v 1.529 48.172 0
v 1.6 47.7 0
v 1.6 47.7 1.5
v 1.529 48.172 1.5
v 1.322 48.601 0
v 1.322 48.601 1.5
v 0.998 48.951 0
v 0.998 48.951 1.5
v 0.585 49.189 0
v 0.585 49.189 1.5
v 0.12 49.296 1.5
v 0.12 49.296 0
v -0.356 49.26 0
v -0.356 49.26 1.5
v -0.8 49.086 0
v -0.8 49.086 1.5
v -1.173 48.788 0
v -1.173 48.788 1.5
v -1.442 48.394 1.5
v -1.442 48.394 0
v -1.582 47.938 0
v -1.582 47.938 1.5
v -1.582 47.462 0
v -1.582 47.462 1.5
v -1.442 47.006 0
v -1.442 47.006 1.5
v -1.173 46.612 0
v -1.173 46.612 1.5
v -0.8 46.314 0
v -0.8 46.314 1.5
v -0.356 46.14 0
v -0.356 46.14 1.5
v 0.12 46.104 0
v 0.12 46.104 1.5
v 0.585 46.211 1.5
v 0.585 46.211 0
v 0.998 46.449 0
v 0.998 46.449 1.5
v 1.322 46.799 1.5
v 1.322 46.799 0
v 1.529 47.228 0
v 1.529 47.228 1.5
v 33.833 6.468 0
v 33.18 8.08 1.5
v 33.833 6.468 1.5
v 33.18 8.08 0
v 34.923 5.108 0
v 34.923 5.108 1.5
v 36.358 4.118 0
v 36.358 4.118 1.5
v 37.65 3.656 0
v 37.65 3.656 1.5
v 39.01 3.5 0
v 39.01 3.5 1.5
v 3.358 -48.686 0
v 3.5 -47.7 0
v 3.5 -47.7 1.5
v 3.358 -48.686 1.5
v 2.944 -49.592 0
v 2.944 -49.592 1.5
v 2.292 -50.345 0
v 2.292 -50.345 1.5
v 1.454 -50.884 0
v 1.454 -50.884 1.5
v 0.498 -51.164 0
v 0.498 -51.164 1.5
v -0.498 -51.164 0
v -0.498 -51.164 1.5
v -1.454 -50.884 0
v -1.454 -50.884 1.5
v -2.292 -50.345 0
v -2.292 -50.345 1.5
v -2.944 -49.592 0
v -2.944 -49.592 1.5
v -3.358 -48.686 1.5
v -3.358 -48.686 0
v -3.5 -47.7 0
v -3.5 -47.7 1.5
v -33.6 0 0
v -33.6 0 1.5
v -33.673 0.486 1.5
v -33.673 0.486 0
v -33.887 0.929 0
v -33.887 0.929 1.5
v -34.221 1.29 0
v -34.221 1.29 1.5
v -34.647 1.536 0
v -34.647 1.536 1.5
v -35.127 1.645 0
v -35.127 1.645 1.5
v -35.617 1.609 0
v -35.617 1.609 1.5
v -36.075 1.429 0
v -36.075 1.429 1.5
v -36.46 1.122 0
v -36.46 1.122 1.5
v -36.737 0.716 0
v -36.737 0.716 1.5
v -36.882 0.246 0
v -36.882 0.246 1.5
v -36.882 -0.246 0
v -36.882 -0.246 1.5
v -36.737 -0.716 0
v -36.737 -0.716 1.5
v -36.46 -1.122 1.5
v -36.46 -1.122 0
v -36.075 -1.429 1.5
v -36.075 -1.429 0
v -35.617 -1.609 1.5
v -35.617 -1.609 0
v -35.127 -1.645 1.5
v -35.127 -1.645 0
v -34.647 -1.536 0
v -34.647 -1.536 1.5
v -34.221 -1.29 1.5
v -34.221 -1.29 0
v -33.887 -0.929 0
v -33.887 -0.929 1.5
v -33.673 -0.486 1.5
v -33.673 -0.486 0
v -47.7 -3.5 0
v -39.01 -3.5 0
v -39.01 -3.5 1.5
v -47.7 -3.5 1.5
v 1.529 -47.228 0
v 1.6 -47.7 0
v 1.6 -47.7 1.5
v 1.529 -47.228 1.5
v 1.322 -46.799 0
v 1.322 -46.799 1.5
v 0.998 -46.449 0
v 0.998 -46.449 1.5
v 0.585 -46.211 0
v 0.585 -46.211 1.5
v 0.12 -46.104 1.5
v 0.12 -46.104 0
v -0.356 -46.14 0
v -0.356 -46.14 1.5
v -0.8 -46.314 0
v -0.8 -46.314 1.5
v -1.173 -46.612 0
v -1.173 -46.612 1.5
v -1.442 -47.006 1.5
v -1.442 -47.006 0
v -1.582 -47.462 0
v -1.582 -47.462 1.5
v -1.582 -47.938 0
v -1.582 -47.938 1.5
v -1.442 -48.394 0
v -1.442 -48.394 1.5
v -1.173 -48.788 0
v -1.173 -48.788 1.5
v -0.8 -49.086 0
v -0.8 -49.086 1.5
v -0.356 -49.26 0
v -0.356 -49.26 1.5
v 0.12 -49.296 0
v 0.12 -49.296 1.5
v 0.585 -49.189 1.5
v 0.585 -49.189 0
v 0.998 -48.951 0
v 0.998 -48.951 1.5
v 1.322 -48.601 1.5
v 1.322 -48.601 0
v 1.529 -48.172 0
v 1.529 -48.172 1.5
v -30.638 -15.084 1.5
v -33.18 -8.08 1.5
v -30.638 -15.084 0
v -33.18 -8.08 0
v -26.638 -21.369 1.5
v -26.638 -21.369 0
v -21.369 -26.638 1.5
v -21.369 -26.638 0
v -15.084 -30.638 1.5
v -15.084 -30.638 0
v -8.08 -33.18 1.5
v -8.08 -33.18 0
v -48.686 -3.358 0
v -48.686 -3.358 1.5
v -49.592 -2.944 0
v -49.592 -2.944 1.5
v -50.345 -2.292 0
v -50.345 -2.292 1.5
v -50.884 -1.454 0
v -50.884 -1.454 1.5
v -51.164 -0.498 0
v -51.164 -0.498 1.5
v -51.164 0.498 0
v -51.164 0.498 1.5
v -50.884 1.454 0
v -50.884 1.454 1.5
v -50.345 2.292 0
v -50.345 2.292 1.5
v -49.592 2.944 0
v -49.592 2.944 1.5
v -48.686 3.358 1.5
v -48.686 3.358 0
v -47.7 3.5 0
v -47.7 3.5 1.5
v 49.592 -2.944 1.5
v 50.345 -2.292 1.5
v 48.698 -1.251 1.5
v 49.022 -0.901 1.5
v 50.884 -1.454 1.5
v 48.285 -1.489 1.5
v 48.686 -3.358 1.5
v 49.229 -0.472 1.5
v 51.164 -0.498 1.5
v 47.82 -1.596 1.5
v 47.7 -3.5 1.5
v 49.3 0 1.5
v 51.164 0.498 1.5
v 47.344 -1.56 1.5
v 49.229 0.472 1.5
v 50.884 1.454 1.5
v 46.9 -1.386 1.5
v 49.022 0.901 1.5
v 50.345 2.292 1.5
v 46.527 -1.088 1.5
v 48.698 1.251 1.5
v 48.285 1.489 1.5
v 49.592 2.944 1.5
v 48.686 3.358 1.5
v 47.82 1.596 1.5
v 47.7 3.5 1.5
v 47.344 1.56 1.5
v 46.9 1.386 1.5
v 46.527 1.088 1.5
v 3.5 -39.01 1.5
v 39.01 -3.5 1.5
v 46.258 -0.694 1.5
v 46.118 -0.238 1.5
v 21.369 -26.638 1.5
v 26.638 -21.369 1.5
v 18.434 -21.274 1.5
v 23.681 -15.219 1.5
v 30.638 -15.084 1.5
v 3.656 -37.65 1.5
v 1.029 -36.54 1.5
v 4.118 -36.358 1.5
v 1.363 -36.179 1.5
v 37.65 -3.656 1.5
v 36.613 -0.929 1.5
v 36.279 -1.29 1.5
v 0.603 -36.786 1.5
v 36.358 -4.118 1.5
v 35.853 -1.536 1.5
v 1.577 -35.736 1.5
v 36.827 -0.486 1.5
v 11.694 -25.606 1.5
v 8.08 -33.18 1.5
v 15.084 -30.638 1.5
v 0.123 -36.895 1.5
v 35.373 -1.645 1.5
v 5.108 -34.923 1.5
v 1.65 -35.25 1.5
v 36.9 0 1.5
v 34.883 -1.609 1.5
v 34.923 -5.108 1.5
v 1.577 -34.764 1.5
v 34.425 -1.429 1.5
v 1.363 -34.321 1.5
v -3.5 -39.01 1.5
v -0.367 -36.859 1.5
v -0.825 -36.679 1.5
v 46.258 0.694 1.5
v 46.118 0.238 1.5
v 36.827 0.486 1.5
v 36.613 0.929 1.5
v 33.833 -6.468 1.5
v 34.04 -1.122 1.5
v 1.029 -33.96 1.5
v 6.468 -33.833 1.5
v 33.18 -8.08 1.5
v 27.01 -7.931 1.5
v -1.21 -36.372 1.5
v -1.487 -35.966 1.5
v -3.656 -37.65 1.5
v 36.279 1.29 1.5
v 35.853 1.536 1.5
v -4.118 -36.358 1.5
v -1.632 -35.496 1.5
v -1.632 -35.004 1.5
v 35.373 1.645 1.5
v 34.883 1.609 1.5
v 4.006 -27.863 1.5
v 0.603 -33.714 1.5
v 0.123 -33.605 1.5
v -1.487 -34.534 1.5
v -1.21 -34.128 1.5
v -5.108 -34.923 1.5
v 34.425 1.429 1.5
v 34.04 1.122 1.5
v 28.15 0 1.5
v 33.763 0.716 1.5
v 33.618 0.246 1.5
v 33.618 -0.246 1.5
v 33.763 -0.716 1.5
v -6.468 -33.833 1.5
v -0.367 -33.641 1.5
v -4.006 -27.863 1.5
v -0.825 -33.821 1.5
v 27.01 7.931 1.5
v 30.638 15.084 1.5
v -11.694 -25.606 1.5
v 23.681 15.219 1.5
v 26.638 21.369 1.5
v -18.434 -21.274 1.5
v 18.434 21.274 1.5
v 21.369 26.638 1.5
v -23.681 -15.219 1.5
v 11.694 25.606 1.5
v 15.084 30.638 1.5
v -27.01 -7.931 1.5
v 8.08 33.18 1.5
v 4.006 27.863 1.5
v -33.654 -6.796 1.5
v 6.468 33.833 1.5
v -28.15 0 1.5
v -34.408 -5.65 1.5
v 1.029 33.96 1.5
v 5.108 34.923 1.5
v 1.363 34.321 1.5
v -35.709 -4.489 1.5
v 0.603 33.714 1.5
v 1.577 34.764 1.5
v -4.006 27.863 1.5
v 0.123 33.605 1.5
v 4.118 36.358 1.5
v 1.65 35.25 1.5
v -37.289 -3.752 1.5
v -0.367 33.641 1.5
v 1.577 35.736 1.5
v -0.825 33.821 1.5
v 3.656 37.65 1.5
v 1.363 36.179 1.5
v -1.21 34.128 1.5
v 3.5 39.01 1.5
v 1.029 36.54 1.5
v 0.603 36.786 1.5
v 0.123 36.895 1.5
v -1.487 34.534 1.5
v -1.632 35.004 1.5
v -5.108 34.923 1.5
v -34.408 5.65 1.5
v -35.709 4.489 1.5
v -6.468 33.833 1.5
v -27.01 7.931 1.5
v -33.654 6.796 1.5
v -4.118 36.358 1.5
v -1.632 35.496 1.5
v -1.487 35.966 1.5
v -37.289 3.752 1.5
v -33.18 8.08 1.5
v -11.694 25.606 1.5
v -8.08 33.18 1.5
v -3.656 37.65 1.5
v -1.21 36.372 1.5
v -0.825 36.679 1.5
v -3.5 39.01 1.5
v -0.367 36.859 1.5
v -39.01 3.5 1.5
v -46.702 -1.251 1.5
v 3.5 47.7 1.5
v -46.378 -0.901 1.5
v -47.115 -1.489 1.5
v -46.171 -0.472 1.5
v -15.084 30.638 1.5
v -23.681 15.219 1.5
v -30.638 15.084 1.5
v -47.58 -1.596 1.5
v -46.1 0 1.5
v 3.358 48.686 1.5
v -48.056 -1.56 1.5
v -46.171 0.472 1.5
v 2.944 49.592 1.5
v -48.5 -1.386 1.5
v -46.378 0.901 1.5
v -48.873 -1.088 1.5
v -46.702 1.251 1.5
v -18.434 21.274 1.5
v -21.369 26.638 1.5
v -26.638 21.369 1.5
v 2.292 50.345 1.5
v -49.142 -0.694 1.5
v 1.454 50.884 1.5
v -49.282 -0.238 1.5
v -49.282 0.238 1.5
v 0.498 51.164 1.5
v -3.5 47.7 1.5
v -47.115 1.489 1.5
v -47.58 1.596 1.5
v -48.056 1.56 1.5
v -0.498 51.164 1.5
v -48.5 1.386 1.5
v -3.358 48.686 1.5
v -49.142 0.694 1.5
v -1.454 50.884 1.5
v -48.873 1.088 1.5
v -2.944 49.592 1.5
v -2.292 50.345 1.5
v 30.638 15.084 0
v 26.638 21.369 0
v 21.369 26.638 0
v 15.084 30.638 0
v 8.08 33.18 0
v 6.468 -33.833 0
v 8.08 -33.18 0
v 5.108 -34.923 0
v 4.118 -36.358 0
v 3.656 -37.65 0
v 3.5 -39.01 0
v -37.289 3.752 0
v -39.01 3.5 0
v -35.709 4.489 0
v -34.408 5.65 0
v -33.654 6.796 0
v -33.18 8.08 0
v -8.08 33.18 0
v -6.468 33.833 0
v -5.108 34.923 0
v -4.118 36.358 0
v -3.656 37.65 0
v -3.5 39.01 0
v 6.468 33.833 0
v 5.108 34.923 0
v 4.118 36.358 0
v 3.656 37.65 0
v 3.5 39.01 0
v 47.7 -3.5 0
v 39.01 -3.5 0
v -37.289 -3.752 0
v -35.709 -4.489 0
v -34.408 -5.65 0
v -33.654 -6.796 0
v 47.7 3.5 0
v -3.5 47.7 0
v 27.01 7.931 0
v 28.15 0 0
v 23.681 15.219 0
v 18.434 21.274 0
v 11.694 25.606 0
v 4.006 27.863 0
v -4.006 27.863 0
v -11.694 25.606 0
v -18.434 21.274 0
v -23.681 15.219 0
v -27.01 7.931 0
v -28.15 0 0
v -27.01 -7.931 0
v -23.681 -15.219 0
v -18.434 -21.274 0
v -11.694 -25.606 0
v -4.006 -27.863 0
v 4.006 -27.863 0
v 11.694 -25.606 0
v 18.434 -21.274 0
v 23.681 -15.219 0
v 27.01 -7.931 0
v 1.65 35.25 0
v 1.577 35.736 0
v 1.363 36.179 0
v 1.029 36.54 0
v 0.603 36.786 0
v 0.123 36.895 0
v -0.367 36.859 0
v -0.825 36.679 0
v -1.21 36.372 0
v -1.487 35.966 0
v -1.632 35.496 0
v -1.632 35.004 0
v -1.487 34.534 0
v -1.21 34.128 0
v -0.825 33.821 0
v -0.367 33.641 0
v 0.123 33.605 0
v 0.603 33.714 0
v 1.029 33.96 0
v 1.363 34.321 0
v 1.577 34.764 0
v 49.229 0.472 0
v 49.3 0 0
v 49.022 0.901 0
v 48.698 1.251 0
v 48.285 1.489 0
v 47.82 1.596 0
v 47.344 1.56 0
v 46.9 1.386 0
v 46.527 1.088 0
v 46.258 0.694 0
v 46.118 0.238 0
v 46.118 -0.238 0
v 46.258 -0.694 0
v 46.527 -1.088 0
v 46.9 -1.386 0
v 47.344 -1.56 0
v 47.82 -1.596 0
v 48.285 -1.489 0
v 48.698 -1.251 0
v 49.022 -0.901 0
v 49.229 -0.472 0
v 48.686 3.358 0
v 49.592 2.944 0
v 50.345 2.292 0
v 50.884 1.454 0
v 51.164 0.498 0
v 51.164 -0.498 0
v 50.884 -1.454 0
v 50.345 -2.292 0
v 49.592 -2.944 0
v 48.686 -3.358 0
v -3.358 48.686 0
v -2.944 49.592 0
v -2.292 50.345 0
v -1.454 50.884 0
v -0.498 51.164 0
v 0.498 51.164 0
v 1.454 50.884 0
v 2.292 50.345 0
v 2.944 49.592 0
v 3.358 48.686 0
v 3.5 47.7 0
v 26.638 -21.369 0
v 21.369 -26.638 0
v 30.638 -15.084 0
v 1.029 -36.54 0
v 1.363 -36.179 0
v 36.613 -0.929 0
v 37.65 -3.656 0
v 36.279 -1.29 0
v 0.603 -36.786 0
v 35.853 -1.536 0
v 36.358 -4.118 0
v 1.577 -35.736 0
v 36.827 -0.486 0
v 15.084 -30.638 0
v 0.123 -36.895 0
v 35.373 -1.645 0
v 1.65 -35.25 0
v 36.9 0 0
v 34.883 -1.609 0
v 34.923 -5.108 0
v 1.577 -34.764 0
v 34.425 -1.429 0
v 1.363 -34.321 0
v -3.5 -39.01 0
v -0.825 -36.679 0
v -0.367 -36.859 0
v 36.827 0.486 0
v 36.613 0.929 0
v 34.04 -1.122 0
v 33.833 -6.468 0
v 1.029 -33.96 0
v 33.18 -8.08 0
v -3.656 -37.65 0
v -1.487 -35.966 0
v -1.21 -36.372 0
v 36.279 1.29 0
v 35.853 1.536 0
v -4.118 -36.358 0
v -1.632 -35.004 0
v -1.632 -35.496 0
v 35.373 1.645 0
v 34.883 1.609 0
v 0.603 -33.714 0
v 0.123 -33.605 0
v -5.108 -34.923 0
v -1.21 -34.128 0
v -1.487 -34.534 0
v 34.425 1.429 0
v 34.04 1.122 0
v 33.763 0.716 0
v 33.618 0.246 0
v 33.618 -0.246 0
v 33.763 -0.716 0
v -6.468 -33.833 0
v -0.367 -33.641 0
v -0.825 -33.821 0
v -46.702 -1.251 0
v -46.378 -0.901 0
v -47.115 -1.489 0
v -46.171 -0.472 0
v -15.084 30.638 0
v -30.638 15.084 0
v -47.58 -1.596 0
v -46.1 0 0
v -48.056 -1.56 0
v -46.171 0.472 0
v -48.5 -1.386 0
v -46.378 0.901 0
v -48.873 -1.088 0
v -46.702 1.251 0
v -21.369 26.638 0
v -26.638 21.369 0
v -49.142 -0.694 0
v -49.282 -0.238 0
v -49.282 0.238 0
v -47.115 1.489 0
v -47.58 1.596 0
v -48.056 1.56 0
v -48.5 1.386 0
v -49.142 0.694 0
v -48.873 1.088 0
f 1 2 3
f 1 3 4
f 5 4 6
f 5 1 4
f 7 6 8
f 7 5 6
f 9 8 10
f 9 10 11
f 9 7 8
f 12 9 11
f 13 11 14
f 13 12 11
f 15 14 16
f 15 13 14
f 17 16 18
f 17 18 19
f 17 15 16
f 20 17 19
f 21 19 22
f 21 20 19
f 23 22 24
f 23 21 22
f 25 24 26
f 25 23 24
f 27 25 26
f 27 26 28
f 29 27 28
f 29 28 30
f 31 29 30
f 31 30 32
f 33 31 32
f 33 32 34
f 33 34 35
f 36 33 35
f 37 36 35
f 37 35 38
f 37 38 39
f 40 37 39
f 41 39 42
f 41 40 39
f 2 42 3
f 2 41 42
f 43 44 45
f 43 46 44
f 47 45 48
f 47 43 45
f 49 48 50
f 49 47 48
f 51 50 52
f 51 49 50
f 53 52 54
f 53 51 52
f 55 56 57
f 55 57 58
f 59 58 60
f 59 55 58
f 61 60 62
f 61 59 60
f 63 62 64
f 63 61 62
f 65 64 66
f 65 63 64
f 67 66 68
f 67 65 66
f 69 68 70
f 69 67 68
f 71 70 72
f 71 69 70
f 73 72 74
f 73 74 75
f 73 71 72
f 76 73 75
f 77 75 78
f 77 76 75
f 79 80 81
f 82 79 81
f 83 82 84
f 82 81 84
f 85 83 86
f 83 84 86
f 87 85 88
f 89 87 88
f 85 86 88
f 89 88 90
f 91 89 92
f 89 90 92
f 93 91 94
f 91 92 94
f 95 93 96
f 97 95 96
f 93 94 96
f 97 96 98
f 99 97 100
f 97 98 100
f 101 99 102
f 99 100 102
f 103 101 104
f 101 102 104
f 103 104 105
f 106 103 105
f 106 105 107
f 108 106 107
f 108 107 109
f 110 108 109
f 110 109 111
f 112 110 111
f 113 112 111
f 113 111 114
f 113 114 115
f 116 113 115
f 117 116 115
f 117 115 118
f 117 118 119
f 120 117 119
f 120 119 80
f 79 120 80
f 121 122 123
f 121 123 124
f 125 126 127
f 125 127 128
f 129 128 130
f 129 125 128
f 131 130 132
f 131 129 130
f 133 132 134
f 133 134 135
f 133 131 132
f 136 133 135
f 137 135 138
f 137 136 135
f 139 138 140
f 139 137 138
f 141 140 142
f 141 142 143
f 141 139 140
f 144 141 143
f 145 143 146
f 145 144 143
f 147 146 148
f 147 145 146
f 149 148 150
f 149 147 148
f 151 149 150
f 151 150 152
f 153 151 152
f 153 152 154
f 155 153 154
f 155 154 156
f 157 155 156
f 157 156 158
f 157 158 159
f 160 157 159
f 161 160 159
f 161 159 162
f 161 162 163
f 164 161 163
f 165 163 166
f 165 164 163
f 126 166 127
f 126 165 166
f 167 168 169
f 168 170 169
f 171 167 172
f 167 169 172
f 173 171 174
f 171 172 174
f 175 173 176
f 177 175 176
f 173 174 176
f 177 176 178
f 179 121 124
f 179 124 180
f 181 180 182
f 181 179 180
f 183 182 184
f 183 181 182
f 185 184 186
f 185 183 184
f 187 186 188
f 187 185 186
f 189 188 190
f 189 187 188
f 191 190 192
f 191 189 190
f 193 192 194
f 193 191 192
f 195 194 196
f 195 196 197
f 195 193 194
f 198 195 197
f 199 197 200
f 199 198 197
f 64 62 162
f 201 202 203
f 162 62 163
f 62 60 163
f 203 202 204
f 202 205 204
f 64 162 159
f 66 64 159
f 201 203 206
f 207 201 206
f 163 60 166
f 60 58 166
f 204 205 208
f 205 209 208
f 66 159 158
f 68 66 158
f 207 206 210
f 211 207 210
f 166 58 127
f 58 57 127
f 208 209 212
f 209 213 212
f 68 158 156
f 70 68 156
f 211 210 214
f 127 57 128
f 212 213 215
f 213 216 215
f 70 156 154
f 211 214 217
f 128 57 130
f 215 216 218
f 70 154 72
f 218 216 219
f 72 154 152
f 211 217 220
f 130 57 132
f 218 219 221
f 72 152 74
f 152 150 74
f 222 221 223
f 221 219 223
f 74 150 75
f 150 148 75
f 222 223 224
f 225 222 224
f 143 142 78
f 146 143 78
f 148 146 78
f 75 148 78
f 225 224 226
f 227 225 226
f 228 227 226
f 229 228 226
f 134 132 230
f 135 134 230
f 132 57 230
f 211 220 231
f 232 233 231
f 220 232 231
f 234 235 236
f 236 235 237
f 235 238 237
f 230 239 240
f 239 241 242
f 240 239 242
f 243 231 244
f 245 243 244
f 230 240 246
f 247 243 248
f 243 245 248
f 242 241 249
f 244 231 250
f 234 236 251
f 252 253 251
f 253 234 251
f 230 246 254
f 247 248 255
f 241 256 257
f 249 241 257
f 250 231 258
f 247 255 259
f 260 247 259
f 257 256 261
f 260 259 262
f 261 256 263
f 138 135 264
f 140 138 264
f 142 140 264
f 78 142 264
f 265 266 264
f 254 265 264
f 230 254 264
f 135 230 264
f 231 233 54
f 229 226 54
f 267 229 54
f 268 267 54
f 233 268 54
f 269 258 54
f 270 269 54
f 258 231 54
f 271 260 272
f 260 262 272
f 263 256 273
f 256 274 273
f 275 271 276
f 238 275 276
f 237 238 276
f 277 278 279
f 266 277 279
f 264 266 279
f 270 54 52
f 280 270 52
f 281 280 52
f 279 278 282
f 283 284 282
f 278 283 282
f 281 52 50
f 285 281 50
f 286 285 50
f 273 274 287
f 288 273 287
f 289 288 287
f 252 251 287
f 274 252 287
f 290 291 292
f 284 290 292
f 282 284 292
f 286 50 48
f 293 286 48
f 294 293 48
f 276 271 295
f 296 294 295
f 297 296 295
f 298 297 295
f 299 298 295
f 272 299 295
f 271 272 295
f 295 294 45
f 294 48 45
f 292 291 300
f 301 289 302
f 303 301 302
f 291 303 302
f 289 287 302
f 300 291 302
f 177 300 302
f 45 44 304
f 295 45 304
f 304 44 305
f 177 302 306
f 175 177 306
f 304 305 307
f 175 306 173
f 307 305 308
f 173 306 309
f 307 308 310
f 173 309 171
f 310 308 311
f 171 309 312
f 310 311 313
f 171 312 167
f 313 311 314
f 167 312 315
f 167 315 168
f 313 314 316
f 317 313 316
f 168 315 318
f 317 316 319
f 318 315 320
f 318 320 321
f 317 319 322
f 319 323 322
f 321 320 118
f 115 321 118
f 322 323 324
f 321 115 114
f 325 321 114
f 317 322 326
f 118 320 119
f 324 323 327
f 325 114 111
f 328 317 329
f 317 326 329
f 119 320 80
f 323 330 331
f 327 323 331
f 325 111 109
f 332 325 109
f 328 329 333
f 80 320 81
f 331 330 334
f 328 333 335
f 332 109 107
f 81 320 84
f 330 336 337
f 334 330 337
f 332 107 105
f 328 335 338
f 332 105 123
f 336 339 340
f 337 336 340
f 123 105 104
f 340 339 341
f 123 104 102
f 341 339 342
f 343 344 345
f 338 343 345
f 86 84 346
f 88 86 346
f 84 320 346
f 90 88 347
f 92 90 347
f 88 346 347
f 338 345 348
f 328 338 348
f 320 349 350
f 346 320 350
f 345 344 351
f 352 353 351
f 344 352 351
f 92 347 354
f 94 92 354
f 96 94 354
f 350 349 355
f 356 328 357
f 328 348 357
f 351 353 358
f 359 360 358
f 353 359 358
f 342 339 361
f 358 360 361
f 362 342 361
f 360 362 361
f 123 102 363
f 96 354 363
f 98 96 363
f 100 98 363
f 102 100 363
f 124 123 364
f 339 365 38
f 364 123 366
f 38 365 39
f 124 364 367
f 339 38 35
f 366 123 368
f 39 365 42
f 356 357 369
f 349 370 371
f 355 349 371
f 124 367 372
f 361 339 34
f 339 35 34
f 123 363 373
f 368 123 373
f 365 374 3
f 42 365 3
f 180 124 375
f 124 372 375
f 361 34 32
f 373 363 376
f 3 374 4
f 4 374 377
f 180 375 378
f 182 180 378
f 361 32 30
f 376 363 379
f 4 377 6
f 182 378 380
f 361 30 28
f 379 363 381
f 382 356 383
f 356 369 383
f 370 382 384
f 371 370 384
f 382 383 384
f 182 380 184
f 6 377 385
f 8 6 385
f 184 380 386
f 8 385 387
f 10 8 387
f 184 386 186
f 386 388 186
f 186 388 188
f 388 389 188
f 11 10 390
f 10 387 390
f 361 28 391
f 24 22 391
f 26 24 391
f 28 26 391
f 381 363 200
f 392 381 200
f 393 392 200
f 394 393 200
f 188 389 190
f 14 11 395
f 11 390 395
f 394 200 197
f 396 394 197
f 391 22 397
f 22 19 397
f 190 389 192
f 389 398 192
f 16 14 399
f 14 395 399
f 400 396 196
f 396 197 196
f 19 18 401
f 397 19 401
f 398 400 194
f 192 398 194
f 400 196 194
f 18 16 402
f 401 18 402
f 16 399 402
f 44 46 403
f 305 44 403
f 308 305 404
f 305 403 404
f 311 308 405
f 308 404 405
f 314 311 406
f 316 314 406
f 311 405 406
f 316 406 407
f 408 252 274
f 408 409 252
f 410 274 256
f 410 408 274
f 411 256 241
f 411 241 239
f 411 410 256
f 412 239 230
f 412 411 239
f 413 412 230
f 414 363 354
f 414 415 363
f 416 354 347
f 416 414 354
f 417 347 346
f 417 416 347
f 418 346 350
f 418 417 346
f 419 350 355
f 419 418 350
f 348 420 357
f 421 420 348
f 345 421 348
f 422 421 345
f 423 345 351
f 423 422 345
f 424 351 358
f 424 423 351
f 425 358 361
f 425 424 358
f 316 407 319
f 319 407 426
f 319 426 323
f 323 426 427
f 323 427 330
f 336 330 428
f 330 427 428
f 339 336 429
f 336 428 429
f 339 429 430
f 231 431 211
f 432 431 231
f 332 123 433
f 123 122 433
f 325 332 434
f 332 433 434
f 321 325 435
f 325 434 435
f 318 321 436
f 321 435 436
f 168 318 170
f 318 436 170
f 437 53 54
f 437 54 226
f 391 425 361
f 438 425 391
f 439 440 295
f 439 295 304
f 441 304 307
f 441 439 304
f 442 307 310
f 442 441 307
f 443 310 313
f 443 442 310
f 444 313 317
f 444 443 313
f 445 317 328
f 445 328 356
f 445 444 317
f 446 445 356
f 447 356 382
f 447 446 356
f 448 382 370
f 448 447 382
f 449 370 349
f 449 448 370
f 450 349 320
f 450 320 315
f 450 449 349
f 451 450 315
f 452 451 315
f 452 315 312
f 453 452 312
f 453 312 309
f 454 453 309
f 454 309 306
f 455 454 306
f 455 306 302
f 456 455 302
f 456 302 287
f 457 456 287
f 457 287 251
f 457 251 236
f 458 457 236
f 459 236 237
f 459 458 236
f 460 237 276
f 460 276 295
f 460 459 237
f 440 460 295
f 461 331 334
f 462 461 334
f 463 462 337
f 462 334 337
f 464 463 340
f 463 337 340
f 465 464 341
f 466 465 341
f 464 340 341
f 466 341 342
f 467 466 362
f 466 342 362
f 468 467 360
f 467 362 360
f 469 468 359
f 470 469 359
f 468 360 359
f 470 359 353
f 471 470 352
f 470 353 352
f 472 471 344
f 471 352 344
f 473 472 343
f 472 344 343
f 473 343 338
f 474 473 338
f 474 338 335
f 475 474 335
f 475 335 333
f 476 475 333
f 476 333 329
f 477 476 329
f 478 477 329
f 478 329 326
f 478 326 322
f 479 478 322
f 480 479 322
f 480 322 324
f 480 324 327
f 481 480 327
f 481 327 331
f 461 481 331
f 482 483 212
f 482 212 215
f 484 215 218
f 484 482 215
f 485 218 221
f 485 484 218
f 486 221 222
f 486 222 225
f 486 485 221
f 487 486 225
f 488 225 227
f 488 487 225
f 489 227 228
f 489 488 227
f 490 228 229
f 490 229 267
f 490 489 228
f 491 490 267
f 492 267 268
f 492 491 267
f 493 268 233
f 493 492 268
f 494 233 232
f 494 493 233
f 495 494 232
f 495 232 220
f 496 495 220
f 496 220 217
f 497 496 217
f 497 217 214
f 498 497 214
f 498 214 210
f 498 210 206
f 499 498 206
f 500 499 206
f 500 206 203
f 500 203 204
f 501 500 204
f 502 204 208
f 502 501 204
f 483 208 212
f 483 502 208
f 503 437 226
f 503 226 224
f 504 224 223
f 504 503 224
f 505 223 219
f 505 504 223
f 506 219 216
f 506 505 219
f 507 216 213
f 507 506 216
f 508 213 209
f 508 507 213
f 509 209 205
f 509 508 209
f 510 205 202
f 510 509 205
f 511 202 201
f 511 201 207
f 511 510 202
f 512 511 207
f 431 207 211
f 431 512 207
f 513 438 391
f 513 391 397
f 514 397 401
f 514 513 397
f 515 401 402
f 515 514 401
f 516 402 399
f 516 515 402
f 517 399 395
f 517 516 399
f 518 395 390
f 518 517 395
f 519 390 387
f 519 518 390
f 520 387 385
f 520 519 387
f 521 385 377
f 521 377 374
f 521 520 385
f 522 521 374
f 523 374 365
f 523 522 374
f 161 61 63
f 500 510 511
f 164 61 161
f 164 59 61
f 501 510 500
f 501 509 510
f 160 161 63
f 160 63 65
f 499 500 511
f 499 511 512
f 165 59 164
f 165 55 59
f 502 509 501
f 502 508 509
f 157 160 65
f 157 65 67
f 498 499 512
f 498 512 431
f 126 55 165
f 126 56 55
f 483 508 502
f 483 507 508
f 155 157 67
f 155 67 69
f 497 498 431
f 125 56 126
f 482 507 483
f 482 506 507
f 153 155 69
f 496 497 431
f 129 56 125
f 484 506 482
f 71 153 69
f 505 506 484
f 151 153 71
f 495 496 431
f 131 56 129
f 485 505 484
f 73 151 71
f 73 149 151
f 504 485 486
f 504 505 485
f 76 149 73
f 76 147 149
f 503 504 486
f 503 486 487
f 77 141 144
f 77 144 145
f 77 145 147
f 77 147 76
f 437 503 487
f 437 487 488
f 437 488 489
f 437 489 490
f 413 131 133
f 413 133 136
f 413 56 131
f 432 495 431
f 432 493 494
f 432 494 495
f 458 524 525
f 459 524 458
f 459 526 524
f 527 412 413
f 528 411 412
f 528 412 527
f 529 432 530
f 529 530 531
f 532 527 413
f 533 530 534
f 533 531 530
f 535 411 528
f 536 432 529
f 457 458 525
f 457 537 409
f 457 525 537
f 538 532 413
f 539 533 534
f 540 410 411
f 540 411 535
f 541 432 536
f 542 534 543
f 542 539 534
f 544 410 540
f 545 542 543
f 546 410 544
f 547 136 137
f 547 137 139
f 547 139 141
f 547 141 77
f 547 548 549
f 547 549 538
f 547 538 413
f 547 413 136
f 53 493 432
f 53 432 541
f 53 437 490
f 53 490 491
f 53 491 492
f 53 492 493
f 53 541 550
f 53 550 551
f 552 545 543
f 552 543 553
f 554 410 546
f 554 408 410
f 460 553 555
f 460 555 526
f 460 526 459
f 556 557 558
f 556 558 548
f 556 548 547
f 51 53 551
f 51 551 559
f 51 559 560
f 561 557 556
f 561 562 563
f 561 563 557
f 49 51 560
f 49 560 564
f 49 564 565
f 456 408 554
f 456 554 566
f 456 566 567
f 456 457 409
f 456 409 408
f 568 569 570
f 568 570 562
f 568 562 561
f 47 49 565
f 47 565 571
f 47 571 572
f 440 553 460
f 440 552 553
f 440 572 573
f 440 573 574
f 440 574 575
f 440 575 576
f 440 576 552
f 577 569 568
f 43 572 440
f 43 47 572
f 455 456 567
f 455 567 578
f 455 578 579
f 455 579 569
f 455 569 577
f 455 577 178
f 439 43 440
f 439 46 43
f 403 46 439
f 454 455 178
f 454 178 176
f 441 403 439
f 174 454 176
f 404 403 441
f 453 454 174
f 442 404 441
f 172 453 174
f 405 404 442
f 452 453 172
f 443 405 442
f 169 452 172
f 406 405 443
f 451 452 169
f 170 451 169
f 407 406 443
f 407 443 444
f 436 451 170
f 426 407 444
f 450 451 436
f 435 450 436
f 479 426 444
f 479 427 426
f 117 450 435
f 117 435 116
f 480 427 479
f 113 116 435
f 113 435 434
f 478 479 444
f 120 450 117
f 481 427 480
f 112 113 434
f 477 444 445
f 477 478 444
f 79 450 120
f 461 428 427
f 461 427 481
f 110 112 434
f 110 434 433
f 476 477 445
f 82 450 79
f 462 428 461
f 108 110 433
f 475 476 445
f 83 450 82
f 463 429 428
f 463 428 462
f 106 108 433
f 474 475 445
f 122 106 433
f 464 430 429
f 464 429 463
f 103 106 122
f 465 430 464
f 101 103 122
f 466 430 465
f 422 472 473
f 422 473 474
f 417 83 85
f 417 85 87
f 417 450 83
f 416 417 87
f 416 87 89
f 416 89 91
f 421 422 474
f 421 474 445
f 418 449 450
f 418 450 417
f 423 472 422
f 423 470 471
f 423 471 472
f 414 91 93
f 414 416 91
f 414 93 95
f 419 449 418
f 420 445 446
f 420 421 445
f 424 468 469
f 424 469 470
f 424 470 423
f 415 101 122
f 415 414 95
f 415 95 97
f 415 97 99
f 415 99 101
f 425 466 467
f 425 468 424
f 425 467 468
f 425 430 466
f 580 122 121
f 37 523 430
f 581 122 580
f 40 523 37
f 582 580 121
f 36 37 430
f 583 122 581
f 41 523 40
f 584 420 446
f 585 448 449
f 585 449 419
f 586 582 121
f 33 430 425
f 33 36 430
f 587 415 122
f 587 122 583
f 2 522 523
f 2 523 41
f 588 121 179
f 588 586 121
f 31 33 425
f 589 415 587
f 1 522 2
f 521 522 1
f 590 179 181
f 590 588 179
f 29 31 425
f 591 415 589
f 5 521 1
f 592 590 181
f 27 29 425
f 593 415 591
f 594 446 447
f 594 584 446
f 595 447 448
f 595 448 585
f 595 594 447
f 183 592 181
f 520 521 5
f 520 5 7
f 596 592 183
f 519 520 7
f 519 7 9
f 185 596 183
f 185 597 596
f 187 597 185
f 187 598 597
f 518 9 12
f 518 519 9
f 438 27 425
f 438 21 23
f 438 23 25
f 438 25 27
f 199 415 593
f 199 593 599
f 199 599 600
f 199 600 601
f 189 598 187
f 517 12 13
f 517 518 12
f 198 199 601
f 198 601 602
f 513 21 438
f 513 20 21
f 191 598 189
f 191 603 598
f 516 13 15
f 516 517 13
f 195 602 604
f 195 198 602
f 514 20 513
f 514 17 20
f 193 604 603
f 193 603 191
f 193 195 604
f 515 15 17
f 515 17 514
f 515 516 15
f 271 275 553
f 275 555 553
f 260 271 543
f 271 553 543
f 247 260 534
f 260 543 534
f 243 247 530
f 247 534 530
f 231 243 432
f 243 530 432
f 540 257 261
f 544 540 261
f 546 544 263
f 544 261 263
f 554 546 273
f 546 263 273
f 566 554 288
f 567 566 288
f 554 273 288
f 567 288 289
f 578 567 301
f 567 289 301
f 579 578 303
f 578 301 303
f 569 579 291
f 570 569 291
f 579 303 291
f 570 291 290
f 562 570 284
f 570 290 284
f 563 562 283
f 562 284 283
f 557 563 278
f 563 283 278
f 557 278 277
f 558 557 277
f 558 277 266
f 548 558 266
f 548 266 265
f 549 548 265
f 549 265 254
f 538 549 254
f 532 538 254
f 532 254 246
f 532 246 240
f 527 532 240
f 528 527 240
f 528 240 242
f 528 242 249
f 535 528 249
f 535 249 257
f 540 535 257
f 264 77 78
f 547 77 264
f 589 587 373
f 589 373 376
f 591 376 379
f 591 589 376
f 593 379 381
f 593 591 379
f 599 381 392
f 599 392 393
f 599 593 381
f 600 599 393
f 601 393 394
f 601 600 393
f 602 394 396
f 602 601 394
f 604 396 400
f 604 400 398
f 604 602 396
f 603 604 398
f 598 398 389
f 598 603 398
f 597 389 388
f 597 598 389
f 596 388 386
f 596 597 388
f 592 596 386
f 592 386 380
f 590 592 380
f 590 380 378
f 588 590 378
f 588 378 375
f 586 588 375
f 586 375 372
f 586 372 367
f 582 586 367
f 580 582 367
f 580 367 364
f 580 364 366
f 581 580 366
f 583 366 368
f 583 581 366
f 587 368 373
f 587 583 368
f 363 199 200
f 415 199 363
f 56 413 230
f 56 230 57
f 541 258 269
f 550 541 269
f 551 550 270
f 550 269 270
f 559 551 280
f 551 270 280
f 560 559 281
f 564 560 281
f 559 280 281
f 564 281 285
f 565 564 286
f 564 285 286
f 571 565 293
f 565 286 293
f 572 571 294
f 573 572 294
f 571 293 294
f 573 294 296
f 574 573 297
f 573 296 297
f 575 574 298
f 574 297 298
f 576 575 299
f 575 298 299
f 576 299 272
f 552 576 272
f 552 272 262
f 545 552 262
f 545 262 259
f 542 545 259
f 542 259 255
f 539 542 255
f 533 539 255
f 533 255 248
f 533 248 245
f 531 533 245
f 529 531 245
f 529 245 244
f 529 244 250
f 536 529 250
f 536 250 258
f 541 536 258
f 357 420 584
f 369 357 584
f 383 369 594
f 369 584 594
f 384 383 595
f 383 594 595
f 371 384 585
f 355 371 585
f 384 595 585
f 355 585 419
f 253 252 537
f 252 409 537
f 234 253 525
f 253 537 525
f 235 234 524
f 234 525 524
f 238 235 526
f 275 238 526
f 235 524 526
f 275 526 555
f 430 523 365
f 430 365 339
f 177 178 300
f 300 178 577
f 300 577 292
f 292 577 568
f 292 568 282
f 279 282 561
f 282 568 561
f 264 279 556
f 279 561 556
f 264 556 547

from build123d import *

# Parameters (mm, degrees)
SKETCH_1_R          = 34.15
SKETCH_1_R_2        = 28.15
SKETCH_1_R_3        = 1.6
EXTRUDE_1_DEPTH     = 1.5
FILLET_1_R          = 6
SKETCH_3_R          = 1.65
CUT_EXTRUDE_1_DEPTH = 3


with BuildPart() as part:
    # 草图1 → 凸台-拉伸1 (new body)
    # profile 1 of 5: a face of its own
    with BuildSketch(Plane.XY):
        Circle(SKETCH_1_R)
        Circle(SKETCH_1_R_2, mode=Mode.SUBTRACT)
    # profile 2 of 5: a face of its own
    with BuildSketch(Plane.XY):
        with BuildLine():
            Line((3.5, 47.7), (3.5, 34.15))
            ThreePointArc((3.5, 34.15), (0, 30.65), (-3.5, 34.15))
            Line((-3.5, 34.15), (-3.5, 47.7))
            ThreePointArc((-3.5, 47.7), (0, 51.2), (3.5, 47.7))
        make_face()
        with Locations((0, 47.7)):
            Circle(SKETCH_1_R_3, mode=Mode.SUBTRACT)
    # profile 3 of 5: a face of its own
    with BuildSketch(Plane.XY):
        with BuildLine():
            Line((47.7, -3.5), (34.15, -3.5))
            ThreePointArc((34.15, -3.5), (30.65, 0), (34.15, 3.5))
            Line((34.15, 3.5), (47.7, 3.5))
            ThreePointArc((47.7, 3.5), (51.2, 0), (47.7, -3.5))
        make_face()
        with Locations((47.7, 0)):
            Circle(SKETCH_1_R_3, mode=Mode.SUBTRACT)
    # profile 4 of 5: a face of its own
    with BuildSketch(Plane.XY):
        with BuildLine():
            Line((-3.5, -47.7), (-3.5, -34.15))
            ThreePointArc((-3.5, -34.15), (0, -30.65), (3.5, -34.15))
            Line((3.5, -34.15), (3.5, -47.7))
            ThreePointArc((3.5, -47.7), (0, -51.2), (-3.5, -47.7))
        make_face()
        with Locations((0, -47.7)):
            Circle(SKETCH_1_R_3, mode=Mode.SUBTRACT)
    # profile 5 of 5: a face of its own
    with BuildSketch(Plane.XY):
        with BuildLine():
            Line((-47.7, 3.5), (-34.15, 3.5))
            ThreePointArc((-34.15, 3.5), (-30.65, 0), (-34.15, -3.5))
            Line((-34.15, -3.5), (-47.7, -3.5))
            ThreePointArc((-47.7, -3.5), (-51.2, 0), (-47.7, 3.5))
        make_face()
        with Locations((-47.7, 0)):
            Circle(SKETCH_1_R_3, mode=Mode.SUBTRACT)
    extrude(amount=EXTRUDE_1_DEPTH)

    # 圆角1
    fillet_1_edges = [part.edges().sort_by_distance(p)[0] for p in [
        (-3.49540148, 33.970644217, 0.75),
        (3.49540148, 33.970644217, 0.75),
        (33.970644217, 3.49540148, 0.75),
        (33.970644217, -3.49540148, 0.75),
        (3.49540148, -33.970644217, 0.75),
        (-3.49540148, -33.970644217, 0.75),
        (-33.970644217, -3.49540148, 0.75),
        (-33.970644217, 3.49540148, 0.75),
    ]]
    fillet(fillet_1_edges, radius=FILLET_1_R)

    # 草图3 → 切除-拉伸1 (cut)
    with BuildSketch(Plane.XY.offset(1.5)):
        with Locations((-35.25, 0)):
            Circle(SKETCH_3_R)
        with Locations((0, 35.25)):
            Circle(SKETCH_3_R)
        with Locations((35.25, 0)):
            Circle(SKETCH_3_R)
        with Locations((0, -35.25)):
            Circle(SKETCH_3_R)
    extrude(amount=-CUT_EXTRUDE_1_DEPTH, mode=Mode.SUBTRACT)


solid = part.part
